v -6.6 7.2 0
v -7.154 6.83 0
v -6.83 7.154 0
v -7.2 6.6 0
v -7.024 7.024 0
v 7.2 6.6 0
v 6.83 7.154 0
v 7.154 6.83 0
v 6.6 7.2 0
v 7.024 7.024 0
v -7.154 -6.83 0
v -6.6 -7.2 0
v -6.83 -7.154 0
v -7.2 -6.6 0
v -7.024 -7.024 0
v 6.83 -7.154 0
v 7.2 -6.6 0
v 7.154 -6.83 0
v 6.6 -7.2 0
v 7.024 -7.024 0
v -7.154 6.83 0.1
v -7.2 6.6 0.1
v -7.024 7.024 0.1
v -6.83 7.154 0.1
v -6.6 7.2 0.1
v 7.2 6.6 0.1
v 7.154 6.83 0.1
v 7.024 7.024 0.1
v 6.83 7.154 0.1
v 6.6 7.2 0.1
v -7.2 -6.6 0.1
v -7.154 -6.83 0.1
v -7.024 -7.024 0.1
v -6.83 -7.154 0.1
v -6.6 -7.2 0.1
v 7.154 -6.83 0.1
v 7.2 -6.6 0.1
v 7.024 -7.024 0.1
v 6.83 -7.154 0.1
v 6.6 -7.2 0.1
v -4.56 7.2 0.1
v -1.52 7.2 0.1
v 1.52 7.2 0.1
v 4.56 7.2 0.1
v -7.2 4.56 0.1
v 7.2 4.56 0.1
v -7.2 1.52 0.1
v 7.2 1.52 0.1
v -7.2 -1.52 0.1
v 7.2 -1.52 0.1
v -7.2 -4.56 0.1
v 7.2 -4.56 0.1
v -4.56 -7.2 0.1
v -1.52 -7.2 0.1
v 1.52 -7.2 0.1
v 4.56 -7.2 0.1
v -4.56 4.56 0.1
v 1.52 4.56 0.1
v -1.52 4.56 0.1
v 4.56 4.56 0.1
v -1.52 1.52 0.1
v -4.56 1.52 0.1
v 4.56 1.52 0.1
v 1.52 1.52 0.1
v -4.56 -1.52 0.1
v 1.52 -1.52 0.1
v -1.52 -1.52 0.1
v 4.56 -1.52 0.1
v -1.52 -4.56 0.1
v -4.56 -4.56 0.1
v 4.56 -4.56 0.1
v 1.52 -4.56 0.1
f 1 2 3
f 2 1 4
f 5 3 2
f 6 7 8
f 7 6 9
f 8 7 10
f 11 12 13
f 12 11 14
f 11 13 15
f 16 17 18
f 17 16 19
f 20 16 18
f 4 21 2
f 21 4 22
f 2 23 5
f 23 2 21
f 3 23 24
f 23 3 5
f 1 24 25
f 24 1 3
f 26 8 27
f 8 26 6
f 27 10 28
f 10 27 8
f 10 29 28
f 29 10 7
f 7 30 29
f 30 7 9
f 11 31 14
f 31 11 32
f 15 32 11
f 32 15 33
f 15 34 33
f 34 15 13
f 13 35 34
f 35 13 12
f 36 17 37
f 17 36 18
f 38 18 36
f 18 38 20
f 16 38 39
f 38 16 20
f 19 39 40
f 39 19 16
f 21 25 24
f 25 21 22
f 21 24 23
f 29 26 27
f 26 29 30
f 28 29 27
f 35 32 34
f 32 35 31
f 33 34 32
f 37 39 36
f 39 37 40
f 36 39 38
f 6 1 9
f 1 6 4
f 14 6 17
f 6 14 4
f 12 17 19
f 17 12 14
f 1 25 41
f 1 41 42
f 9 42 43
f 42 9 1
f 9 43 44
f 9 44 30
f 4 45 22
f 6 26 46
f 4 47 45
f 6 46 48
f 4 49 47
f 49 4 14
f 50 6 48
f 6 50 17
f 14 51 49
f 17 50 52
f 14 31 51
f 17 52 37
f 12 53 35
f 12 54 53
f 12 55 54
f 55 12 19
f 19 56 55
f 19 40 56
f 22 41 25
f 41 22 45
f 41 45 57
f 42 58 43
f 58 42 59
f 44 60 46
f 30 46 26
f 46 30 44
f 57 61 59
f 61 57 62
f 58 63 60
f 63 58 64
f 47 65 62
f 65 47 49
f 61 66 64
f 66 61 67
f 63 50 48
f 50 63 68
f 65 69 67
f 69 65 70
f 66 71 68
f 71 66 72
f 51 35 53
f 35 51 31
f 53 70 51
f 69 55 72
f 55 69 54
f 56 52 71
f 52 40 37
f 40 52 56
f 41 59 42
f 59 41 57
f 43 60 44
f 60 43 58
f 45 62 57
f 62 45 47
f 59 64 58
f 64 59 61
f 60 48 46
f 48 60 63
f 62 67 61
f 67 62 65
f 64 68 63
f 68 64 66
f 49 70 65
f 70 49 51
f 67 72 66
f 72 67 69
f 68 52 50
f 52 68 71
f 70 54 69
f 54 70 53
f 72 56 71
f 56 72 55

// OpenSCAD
// file: ../p/1-4cyli.scad
use <../lib.scad>
function ldraw_lib__1_4cyli() = [
// 0 Cylinder 0.25
// 0 Name: 1-4cyli.dat
// 0 Author: James Jessiman
// 0 !LDRAW_ORG Primitive UPDATE 2012-01
// 0 !LICENSE Licensed under CC BY 4.0 : see CAreadme.txt
// 
// 0 BFC CERTIFY CCW
  [0,"BFC","CERTIFY"],
  [0,"BFC","CCW"],
// 
// 0 !HISTORY 2002-03-23 [sbliss] Added BFC statement.
// 0 !HISTORY 2002-04-25 [PTadmin] Official Update 2002-02
// 0 !HISTORY 2007-06-22 [PTadmin] Header formatted for Contributor Agreement
// 0 !HISTORY 2008-07-01 [PTadmin] Official Update 2008-01
// 0 !HISTORY 2012-02-16 [Philo] Changed to CCW
// 0 !HISTORY 2012-03-30 [PTadmin] Official Update 2012-01
// 
// 
// 4 16 1 1 0 0.9239 1 0.3827 0.9239 0 0.3827 1 0 0
  [4,16,1,1,0,0.9239,1,0.3827,0.9239,0,0.3827,1,0,0],
// 5 24 1 0 0 1 1 0 0.9239 0 0.3827 1 0 -1
  [5,24,1,0,0,1,1,0,0.9239,0,0.3827,1,0,-1],
// 4 16 0.9239 1 0.3827 0.7071 1 0.7071 0.7071 0 0.7071 0.9239 0 0.3827
  [4,16,0.9239,1,0.3827,0.7071,1,0.7071,0.7071,0,0.7071,0.9239,0,0.3827],
// 5 24 0.9239 0 0.3827 0.9239 1 0.3827 0.7071 0 0.7071 1 0 0
  [5,24,0.9239,0,0.3827,0.9239,1,0.3827,0.7071,0,0.7071,1,0,0],
// 4 16 0.7071 1 0.7071 0.3827 1 0.9239 0.3827 0 0.9239 0.7071 0 0.7071
  [4,16,0.7071,1,0.7071,0.3827,1,0.9239,0.3827,0,0.9239,0.7071,0,0.7071],
// 5 24 0.7071 0 0.7071 0.7071 1 0.7071 0.3827 0 0.9239 0.9239 0 0.3827
  [5,24,0.7071,0,0.7071,0.7071,1,0.7071,0.3827,0,0.9239,0.9239,0,0.3827],
// 4 16 0.3827 1 0.9239 0 1 1 0 0 1 0.3827 0 0.9239
  [4,16,0.3827,1,0.9239,0,1,1,0,0,1,0.3827,0,0.9239],
// 5 24 0.3827 0 0.9239 0.3827 1 0.9239 0 0 1 0.7071 0 0.7071
  [5,24,0.3827,0,0.9239,0.3827,1,0.9239,0,0,1,0.7071,0,0.7071],
// 5 24 0 0 1 0 1 1 0.3827 0 0.9239 -1 0 1
  [5,24,0,0,1,0,1,1,0.3827,0,0.9239,-1,0,1],
];
module ldraw_lib__1_4cyli(step=0, col=false, unit=2/5, alt=false, line=0.2, solid=!$preview)
    makepoly(ldraw_lib__1_4cyli(), step=step, col=col, unit=unit, alt=alt, line=line, solid=solid);
ldraw_lib__1_4cyli(line=0.2);
// file: ../p/1-4chrd.scad
use <../lib.scad>
function ldraw_lib__1_4chrd() = [
// 0 Chord 0.25
// 0 Name: 1-4chrd.dat
// 0 Author: Tony Hafner [hafhead]
// 0 !LDRAW_ORG Primitive UPDATE 2012-02
// 0 !LICENSE Licensed under CC BY 2.0 and CC BY 4.0 : see CAreadme.txt
// 
// 0 BFC CERTIFY CCW
  [0,"BFC","CERTIFY"],
  [0,"BFC","CCW"],
// 
// 0 !HISTORY 2004-04-22 [PTadmin] Official Update 2004-02
// 0 !HISTORY 2007-10-09 [PTadmin] Header formatted for Contributor Agreement
// 0 !HISTORY 2008-07-01 [PTadmin] Official Update 2008-01
// 0 !HISTORY 2012-08-02 [MMR1988] Re-creation with PrimGen2 and Rectifier
// 0 !HISTORY 2012-08-09 [PTadmin] Official Update 2012-02
// 
// 
// 4 16 0.9239 0 0.3827 0.3827 0 0.9239 0 0 1 1 0 0
  [4,16,0.9239,0,0.3827,0.3827,0,0.9239,0,0,1,1,0,0],
// 3 16 0.7071 0 0.7071 0.3827 0 0.9239 0.9239 0 0.3827
  [3,16,0.7071,0,0.7071,0.3827,0,0.9239,0.9239,0,0.3827],
];
module ldraw_lib__1_4chrd(step=0, col=false, unit=2/5, alt=false, line=0.2, solid=!$preview)
    makepoly(ldraw_lib__1_4chrd(), step=step, col=col, unit=unit, alt=alt, line=line, solid=solid);
ldraw_lib__1_4chrd(line=0.2);
// main file
use <../lib.scad>
use <../p/1-4chrd.scad>
use <../p/1-4cyli.scad>
function ldraw_lib__6141875d() = [
// 0 Sticker  1.8 x  1.8 Chequered
// 0 Name: 6141875d.dat
// 0 Author: Massimo Maso [Sirio]
// 0 !LDRAW_ORG Part UPDATE 2022-06
// 0 !LICENSE Licensed under CC BY 4.0 : see CAreadme.txt
// 
// 0 BFC CERTIFY CCW
  [0,"BFC","CERTIFY"],
  [0,"BFC","CCW"],
// 
// 0 !KEYWORDS Bricklink 75875stk01, Brickowl 53567, Rebrickable 24760, Set 75875
// 0 !KEYWORDS Speed Champions
// 
// 0 !HISTORY 2022-12-20 [PTadmin] Official Update 2022-06
// 
// 
// 0 // Primitives
// 
// 1 16 -16.5 0 16.5 -1.5 0 0 0 -1 0 0 0 1.5 1-4chrd.dat
  [1,16,-16.5,0,16.5,-1.5,0,0,0,-1,0,0,0,1.5, ldraw_lib__1_4chrd()],
// 1 16 16.5 0 16.5 1.5 0 0 0 -1 0 0 0 1.5 1-4chrd.dat
  [1,16,16.5,0,16.5,1.5,0,0,0,-1,0,0,0,1.5, ldraw_lib__1_4chrd()],
// 1 16 -16.5 0 -16.5 -1.5 0 0 0 -1 0 0 0 -1.5 1-4chrd.dat
  [1,16,-16.5,0,-16.5,-1.5,0,0,0,-1,0,0,0,-1.5, ldraw_lib__1_4chrd()],
// 1 16 16.5 0 -16.5 1.5 0 0 0 -1 0 0 0 -1.5 1-4chrd.dat
  [1,16,16.5,0,-16.5,1.5,0,0,0,-1,0,0,0,-1.5, ldraw_lib__1_4chrd()],
// 1 16 -16.5 0 16.5 -1.5 0 0 0 -.25 0 0 0 1.5 1-4cyli.dat
  [1,16,-16.5,0,16.5,-1.5,0,0,0,-.25,0,0,0,1.5, ldraw_lib__1_4cyli()],
// 1 16 16.5 0 16.5 1.5 0 0 0 -.25 0 0 0 1.5 1-4cyli.dat
  [1,16,16.5,0,16.5,1.5,0,0,0,-.25,0,0,0,1.5, ldraw_lib__1_4cyli()],
// 1 16 -16.5 0 -16.5 -1.5 0 0 0 -.25 0 0 0 -1.5 1-4cyli.dat
  [1,16,-16.5,0,-16.5,-1.5,0,0,0,-.25,0,0,0,-1.5, ldraw_lib__1_4cyli()],
// 1 16 16.5 0 -16.5 1.5 0 0 0 -.25 0 0 0 -1.5 1-4cyli.dat
  [1,16,16.5,0,-16.5,1.5,0,0,0,-.25,0,0,0,-1.5, ldraw_lib__1_4cyli()],
// 1 0 -16.5 -.25 16.5 -1.5 0 0 0 1 0 0 0 1.5 1-4chrd.dat
  [1,0,-16.5,-.25,16.5,-1.5,0,0,0,1,0,0,0,1.5, ldraw_lib__1_4chrd()],
// 1 0 16.5 -.25 16.5 1.5 0 0 0 1 0 0 0 1.5 1-4chrd.dat
  [1,0,16.5,-.25,16.5,1.5,0,0,0,1,0,0,0,1.5, ldraw_lib__1_4chrd()],
// 1 0 -16.5 -.25 -16.5 -1.5 0 0 0 1 0 0 0 -1.5 1-4chrd.dat
  [1,0,-16.5,-.25,-16.5,-1.5,0,0,0,1,0,0,0,-1.5, ldraw_lib__1_4chrd()],
// 1 0 16.5 -.25 -16.5 1.5 0 0 0 1 0 0 0 -1.5 1-4chrd.dat
  [1,0,16.5,-.25,-16.5,1.5,0,0,0,1,0,0,0,-1.5, ldraw_lib__1_4chrd()],
// 0 // Bottom face
// 4 16 16.5 0 18 18 0 16.5 -18 0 16.5 -16.5 0 18
  [4,16,16.5,0,18,18,0,16.5,-18,0,16.5,-16.5,0,18],
// 4 16 18 0 16.5 18 0 -16.5 -18 0 -16.5 -18 0 16.5
  [4,16,18,0,16.5,18,0,-16.5,-18,0,-16.5,-18,0,16.5],
// 4 16 16.5 0 -18 -16.5 0 -18 -18 0 -16.5 18 0 -16.5
  [4,16,16.5,0,-18,-16.5,0,-18,-18,0,-16.5,18,0,-16.5],
// 0 // Lateral face
// 3 16 -16.5 0 18 -16.5 -.25 18 -11.4 -.25 18
  [3,16,-16.5,0,18,-16.5,-.25,18,-11.4,-.25,18],
// 3 16 -16.5 0 18 -11.4 -.25 18 -3.8 -.25 18
  [3,16,-16.5,0,18,-11.4,-.25,18,-3.8,-.25,18],
// 4 16 -16.5 0 18 -3.8 -.25 18 3.8 -.25 18 16.5 0 18
  [4,16,-16.5,0,18,-3.8,-.25,18,3.8,-.25,18,16.5,0,18],
// 3 16 16.5 0 18 3.8 -.25 18 11.4 -.25 18
  [3,16,16.5,0,18,3.8,-.25,18,11.4,-.25,18],
// 3 16 16.5 0 18 11.4 -.25 18 16.5 -.25 18
  [3,16,16.5,0,18,11.4,-.25,18,16.5,-.25,18],
// 3 16 -18 0 16.5 -18 -.25 11.4 -18 -.25 16.5
  [3,16,-18,0,16.5,-18,-.25,11.4,-18,-.25,16.5],
// 3 16 18 0 16.5 18 -.25 16.5 18 -.25 11.4
  [3,16,18,0,16.5,18,-.25,16.5,18,-.25,11.4],
// 3 16 -18 0 16.5 -18 -.25 3.8 -18 -.25 11.4
  [3,16,-18,0,16.5,-18,-.25,3.8,-18,-.25,11.4],
// 3 16 18 0 16.5 18 -.25 11.4 18 -.25 3.8
  [3,16,18,0,16.5,18,-.25,11.4,18,-.25,3.8],
// 4 16 -18 0 16.5 -18 0 -16.5 -18 -.25 -3.8 -18 -.25 3.8
  [4,16,-18,0,16.5,-18,0,-16.5,-18,-.25,-3.8,-18,-.25,3.8],
// 4 16 18 0 16.5 18 -.25 3.8 18 -.25 -3.8 18 0 -16.5
  [4,16,18,0,16.5,18,-.25,3.8,18,-.25,-3.8,18,0,-16.5],
// 3 16 -18 0 -16.5 -18 -.25 -11.4 -18 -.25 -3.8
  [3,16,-18,0,-16.5,-18,-.25,-11.4,-18,-.25,-3.8],
// 3 16 18 0 -16.5 18 -.25 -3.8 18 -.25 -11.4
  [3,16,18,0,-16.5,18,-.25,-3.8,18,-.25,-11.4],
// 3 16 -18 0 -16.5 -18 -.25 -16.5 -18 -.25 -11.4
  [3,16,-18,0,-16.5,-18,-.25,-16.5,-18,-.25,-11.4],
// 3 16 18 0 -16.5 18 -.25 -11.4 18 -.25 -16.5
  [3,16,18,0,-16.5,18,-.25,-11.4,18,-.25,-16.5],
// 3 16 -16.5 0 -18 -11.4 -.25 -18 -16.5 -.25 -18
  [3,16,-16.5,0,-18,-11.4,-.25,-18,-16.5,-.25,-18],
// 3 16 -16.5 0 -18 -3.8 -.25 -18 -11.4 -.25 -18
  [3,16,-16.5,0,-18,-3.8,-.25,-18,-11.4,-.25,-18],
// 4 16 -16.5 0 -18 16.5 0 -18 3.8 -.25 -18 -3.8 -.25 -18
  [4,16,-16.5,0,-18,16.5,0,-18,3.8,-.25,-18,-3.8,-.25,-18],
// 3 16 16.5 0 -18 11.4 -.25 -18 3.8 -.25 -18
  [3,16,16.5,0,-18,11.4,-.25,-18,3.8,-.25,-18],
// 3 16 16.5 0 -18 16.5 -.25 -18 11.4 -.25 -18
  [3,16,16.5,0,-18,16.5,-.25,-18,11.4,-.25,-18],
// 0 // Top face
// 0 // Black faces
// 4 0 -11.4 -.25 18 -16.5 -.25 18 -18 -.25 16.5 -18 -.25 11.4
  [4,0,-11.4,-.25,18,-16.5,-.25,18,-18,-.25,16.5,-18,-.25,11.4],
// 3 0 -11.4 -.25 18 -18 -.25 11.4 -11.4 -.25 11.4
  [3,0,-11.4,-.25,18,-18,-.25,11.4,-11.4,-.25,11.4],
// 4 0 -3.8 -.25 18 -3.8 -.25 11.4 3.8 -.25 11.4 3.8 -.25 18
  [4,0,-3.8,-.25,18,-3.8,-.25,11.4,3.8,-.25,11.4,3.8,-.25,18],
// 3 0 11.4 -.25 18 11.4 -.25 11.4 18 -.25 11.4
  [3,0,11.4,-.25,18,11.4,-.25,11.4,18,-.25,11.4],
// 4 0 11.4 -.25 18 18 -.25 11.4 18 -.25 16.5 16.5 -.25 18
  [4,0,11.4,-.25,18,18,-.25,11.4,18,-.25,16.5,16.5,-.25,18],
// 4 0 -11.4 -.25 11.4 -11.4 -.25 3.8 -3.8 -.25 3.8 -3.8 -.25 11.4
  [4,0,-11.4,-.25,11.4,-11.4,-.25,3.8,-3.8,-.25,3.8,-3.8,-.25,11.4],
// 4 0 3.8 -.25 11.4 3.8 -.25 3.8 11.4 -.25 3.8 11.4 -.25 11.4
  [4,0,3.8,-.25,11.4,3.8,-.25,3.8,11.4,-.25,3.8,11.4,-.25,11.4],
// 4 0 -18 -.25 3.8 -18 -.25 -3.8 -11.4 -.25 -3.8 -11.4 -.25 3.8
  [4,0,-18,-.25,3.8,-18,-.25,-3.8,-11.4,-.25,-3.8,-11.4,-.25,3.8],
// 4 0 -3.8 -.25 3.8 -3.8 -.25 -3.8 3.8 -.25 -3.8 3.8 -.25 3.8
  [4,0,-3.8,-.25,3.8,-3.8,-.25,-3.8,3.8,-.25,-3.8,3.8,-.25,3.8],
// 4 0 11.4 -.25 3.8 11.4 -.25 -3.8 18 -.25 -3.8 18 -.25 3.8
  [4,0,11.4,-.25,3.8,11.4,-.25,-3.8,18,-.25,-3.8,18,-.25,3.8],
// 4 0 -11.4 -.25 -3.8 -11.4 -.25 -11.4 -3.8 -.25 -11.4 -3.8 -.25 -3.8
  [4,0,-11.4,-.25,-3.8,-11.4,-.25,-11.4,-3.8,-.25,-11.4,-3.8,-.25,-3.8],
// 4 0 3.8 -.25 -3.8 3.8 -.25 -11.4 11.4 -.25 -11.4 11.4 -.25 -3.8
  [4,0,3.8,-.25,-3.8,3.8,-.25,-11.4,11.4,-.25,-11.4,11.4,-.25,-3.8],
// 4 0 -11.4 -.25 -18 -18 -.25 -11.4 -18 -.25 -16.5 -16.5 -.25 -18
  [4,0,-11.4,-.25,-18,-18,-.25,-11.4,-18,-.25,-16.5,-16.5,-.25,-18],
// 3 0 -11.4 -.25 -18 -11.4 -.25 -11.4 -18 -.25 -11.4
  [3,0,-11.4,-.25,-18,-11.4,-.25,-11.4,-18,-.25,-11.4],
// 4 0 -3.8 -.25 -11.4 -3.8 -.25 -18 3.8 -.25 -18 3.8 -.25 -11.4
  [4,0,-3.8,-.25,-11.4,-3.8,-.25,-18,3.8,-.25,-18,3.8,-.25,-11.4],
// 3 0 11.4 -.25 -18 18 -.25 -11.4 11.4 -.25 -11.4
  [3,0,11.4,-.25,-18,18,-.25,-11.4,11.4,-.25,-11.4],
// 4 0 11.4 -.25 -18 16.5 -.25 -18 18 -.25 -16.5 18 -.25 -11.4
  [4,0,11.4,-.25,-18,16.5,-.25,-18,18,-.25,-16.5,18,-.25,-11.4],
// 0 // White faces
// 4 15 -11.4 -.25 18 -11.4 -.25 11.4 -3.8 -.25 11.4 -3.8 -.25 18
  [4,15,-11.4,-.25,18,-11.4,-.25,11.4,-3.8,-.25,11.4,-3.8,-.25,18],
// 4 15 3.8 -.25 18 3.8 -.25 11.4 11.4 -.25 11.4 11.4 -.25 18
  [4,15,3.8,-.25,18,3.8,-.25,11.4,11.4,-.25,11.4,11.4,-.25,18],
// 4 15 -18 -.25 11.4 -18 -.25 3.8 -11.4 -.25 3.8 -11.4 -.25 11.4
  [4,15,-18,-.25,11.4,-18,-.25,3.8,-11.4,-.25,3.8,-11.4,-.25,11.4],
// 4 15 -3.8 -.25 11.4 -3.8 -.25 3.8 3.8 -.25 3.8 3.8 -.25 11.4
  [4,15,-3.8,-.25,11.4,-3.8,-.25,3.8,3.8,-.25,3.8,3.8,-.25,11.4],
// 4 15 11.4 -.25 11.4 11.4 -.25 3.8 18 -.25 3.8 18 -.25 11.4
  [4,15,11.4,-.25,11.4,11.4,-.25,3.8,18,-.25,3.8,18,-.25,11.4],
// 4 15 -11.4 -.25 3.8 -11.4 -.25 -3.8 -3.8 -.25 -3.8 -3.8 -.25 3.8
  [4,15,-11.4,-.25,3.8,-11.4,-.25,-3.8,-3.8,-.25,-3.8,-3.8,-.25,3.8],
// 4 15 3.8 -.25 3.8 3.8 -.25 -3.8 11.4 -.25 -3.8 11.4 -.25 3.8
  [4,15,3.8,-.25,3.8,3.8,-.25,-3.8,11.4,-.25,-3.8,11.4,-.25,3.8],
// 4 15 -18 -.25 -3.8 -18 -.25 -11.4 -11.4 -.25 -11.4 -11.4 -.25 -3.8
  [4,15,-18,-.25,-3.8,-18,-.25,-11.4,-11.4,-.25,-11.4,-11.4,-.25,-3.8],
// 4 15 -3.8 -.25 -3.8 -3.8 -.25 -11.4 3.8 -.25 -11.4 3.8 -.25 -3.8
  [4,15,-3.8,-.25,-3.8,-3.8,-.25,-11.4,3.8,-.25,-11.4,3.8,-.25,-3.8],
// 4 15 11.4 -.25 -3.8 11.4 -.25 -11.4 18 -.25 -11.4 18 -.25 -3.8
  [4,15,11.4,-.25,-3.8,11.4,-.25,-11.4,18,-.25,-11.4,18,-.25,-3.8],
// 4 15 -11.4 -.25 -11.4 -11.4 -.25 -18 -3.8 -.25 -18 -3.8 -.25 -11.4
  [4,15,-11.4,-.25,-11.4,-11.4,-.25,-18,-3.8,-.25,-18,-3.8,-.25,-11.4],
// 4 15 3.8 -.25 -11.4 3.8 -.25 -18 11.4 -.25 -18 11.4 -.25 -11.4
  [4,15,3.8,-.25,-11.4,3.8,-.25,-18,11.4,-.25,-18,11.4,-.25,-11.4],
];
module ldraw_lib__6141875d(step=0, col=false, unit=2/5, alt=false, line=0.2, solid=!$preview)
    makepoly(ldraw_lib__6141875d(), step=step, col=col, unit=unit, alt=alt, line=line, solid=solid);
ldraw_lib__6141875d(line=0.2);
